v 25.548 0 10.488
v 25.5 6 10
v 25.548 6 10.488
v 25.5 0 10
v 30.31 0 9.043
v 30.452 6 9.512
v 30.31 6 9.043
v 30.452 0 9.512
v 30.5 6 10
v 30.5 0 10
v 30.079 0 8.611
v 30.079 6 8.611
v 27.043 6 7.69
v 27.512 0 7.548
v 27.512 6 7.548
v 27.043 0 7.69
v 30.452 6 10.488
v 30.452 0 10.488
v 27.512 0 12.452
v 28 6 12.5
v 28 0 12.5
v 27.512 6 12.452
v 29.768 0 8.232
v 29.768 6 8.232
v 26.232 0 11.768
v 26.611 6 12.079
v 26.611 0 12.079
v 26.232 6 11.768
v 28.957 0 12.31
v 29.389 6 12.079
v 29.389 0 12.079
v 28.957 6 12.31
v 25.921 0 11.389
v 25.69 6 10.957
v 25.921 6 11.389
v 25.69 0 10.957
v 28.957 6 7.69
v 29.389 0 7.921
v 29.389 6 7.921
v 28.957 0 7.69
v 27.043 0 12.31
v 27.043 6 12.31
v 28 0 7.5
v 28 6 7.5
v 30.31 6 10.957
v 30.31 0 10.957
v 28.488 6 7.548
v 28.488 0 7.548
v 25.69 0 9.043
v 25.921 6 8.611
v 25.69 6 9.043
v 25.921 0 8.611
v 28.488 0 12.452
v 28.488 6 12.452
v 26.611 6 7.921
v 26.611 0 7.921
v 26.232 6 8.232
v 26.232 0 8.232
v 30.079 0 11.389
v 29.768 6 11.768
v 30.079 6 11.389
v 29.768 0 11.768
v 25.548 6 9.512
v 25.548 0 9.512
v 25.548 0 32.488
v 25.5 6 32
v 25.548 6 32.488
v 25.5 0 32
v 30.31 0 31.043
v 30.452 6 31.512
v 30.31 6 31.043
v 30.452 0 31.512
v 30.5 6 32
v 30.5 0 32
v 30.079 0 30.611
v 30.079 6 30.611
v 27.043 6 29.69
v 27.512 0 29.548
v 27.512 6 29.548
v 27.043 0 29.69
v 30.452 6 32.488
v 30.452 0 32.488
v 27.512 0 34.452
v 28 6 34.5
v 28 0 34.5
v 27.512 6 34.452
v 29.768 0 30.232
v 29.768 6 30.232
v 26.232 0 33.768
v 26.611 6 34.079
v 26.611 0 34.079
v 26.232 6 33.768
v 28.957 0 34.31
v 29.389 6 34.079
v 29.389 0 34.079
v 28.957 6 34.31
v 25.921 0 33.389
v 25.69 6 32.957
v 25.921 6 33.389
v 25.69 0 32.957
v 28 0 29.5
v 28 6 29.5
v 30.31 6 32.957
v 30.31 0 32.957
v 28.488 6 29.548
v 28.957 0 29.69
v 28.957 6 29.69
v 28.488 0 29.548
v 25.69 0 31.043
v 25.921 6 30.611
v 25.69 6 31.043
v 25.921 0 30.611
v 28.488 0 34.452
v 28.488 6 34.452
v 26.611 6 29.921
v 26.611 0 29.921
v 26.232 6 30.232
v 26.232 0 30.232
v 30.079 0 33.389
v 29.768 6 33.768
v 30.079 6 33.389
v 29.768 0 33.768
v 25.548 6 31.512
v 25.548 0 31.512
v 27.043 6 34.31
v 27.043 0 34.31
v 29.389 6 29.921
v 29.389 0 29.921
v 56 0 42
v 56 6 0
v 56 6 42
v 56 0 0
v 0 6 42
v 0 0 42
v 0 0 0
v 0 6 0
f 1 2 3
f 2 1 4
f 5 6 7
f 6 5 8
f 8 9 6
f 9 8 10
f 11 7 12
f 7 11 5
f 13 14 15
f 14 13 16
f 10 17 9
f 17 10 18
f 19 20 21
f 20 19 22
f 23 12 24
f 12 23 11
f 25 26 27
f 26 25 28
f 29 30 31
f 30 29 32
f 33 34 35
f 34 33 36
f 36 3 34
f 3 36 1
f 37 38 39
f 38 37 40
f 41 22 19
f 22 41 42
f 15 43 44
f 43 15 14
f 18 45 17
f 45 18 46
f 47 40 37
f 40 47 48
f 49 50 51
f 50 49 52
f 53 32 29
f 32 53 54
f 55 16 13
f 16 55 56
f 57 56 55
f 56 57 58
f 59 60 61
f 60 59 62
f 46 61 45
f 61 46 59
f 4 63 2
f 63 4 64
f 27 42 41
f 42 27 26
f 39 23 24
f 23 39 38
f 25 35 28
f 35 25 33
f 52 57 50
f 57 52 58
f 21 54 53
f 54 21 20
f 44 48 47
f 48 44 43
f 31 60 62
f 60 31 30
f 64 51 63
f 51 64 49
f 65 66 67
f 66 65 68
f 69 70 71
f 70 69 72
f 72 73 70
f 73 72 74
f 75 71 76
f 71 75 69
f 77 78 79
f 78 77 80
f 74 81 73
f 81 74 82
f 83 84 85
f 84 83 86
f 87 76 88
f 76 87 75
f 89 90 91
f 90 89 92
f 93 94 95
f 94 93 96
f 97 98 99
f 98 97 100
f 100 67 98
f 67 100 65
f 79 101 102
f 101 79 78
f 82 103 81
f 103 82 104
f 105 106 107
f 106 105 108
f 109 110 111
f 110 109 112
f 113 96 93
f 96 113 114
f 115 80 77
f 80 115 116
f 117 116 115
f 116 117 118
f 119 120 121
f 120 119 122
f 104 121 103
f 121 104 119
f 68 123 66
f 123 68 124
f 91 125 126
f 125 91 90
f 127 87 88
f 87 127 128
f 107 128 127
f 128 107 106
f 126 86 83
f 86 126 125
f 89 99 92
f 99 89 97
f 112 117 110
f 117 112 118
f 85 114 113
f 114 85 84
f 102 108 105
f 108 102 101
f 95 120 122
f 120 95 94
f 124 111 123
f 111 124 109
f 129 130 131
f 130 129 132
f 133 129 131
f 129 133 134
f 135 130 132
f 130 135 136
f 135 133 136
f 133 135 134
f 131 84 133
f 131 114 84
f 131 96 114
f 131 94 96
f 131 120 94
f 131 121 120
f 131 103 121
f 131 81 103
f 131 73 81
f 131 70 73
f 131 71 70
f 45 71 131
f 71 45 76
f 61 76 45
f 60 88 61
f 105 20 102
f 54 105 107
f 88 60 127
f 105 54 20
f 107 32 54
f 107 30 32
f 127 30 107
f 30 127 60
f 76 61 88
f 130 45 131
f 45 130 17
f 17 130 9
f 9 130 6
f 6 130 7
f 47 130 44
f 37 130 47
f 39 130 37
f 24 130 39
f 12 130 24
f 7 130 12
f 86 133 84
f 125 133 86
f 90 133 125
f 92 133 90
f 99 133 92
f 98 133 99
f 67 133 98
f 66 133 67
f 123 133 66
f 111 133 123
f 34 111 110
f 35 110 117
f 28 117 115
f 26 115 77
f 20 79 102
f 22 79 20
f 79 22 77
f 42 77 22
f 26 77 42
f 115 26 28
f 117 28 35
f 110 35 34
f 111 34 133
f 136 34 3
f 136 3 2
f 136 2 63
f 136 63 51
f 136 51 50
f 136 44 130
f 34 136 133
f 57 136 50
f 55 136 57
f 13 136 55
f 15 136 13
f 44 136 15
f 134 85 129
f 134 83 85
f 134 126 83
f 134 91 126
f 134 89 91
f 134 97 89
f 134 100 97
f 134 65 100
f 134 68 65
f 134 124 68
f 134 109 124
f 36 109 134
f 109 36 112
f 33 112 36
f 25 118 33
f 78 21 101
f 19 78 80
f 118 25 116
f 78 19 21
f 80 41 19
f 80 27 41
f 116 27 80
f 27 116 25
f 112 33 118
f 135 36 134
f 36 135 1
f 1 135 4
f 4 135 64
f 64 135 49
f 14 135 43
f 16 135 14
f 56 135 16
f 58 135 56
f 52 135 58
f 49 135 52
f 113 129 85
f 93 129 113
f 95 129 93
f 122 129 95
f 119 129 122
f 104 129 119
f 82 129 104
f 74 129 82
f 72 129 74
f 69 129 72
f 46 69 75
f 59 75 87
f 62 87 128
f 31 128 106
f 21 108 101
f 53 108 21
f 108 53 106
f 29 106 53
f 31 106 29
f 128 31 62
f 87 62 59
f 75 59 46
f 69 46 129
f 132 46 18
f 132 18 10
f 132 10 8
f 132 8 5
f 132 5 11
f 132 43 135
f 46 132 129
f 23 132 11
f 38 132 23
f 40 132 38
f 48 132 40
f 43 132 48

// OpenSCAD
/* [Dimensions] */
// Overall width
width = 56; // [30:1:100]
// Height of the bracket
height = 42; // [20:1:80]
// Material thickness
thickness = 6; // [3:0.5:12]
// Include mounting holes
mounting_holes = true;

difference() {
    cube([width, thickness, height]);
    if (mounting_holes) {
        for (z = [10, height - 10])
            translate([width / 2, -1, z])
                rotate([-90, 0, 0])
                    cylinder(h = thickness + 2, d = 5, $fn = 32);
    }
}
